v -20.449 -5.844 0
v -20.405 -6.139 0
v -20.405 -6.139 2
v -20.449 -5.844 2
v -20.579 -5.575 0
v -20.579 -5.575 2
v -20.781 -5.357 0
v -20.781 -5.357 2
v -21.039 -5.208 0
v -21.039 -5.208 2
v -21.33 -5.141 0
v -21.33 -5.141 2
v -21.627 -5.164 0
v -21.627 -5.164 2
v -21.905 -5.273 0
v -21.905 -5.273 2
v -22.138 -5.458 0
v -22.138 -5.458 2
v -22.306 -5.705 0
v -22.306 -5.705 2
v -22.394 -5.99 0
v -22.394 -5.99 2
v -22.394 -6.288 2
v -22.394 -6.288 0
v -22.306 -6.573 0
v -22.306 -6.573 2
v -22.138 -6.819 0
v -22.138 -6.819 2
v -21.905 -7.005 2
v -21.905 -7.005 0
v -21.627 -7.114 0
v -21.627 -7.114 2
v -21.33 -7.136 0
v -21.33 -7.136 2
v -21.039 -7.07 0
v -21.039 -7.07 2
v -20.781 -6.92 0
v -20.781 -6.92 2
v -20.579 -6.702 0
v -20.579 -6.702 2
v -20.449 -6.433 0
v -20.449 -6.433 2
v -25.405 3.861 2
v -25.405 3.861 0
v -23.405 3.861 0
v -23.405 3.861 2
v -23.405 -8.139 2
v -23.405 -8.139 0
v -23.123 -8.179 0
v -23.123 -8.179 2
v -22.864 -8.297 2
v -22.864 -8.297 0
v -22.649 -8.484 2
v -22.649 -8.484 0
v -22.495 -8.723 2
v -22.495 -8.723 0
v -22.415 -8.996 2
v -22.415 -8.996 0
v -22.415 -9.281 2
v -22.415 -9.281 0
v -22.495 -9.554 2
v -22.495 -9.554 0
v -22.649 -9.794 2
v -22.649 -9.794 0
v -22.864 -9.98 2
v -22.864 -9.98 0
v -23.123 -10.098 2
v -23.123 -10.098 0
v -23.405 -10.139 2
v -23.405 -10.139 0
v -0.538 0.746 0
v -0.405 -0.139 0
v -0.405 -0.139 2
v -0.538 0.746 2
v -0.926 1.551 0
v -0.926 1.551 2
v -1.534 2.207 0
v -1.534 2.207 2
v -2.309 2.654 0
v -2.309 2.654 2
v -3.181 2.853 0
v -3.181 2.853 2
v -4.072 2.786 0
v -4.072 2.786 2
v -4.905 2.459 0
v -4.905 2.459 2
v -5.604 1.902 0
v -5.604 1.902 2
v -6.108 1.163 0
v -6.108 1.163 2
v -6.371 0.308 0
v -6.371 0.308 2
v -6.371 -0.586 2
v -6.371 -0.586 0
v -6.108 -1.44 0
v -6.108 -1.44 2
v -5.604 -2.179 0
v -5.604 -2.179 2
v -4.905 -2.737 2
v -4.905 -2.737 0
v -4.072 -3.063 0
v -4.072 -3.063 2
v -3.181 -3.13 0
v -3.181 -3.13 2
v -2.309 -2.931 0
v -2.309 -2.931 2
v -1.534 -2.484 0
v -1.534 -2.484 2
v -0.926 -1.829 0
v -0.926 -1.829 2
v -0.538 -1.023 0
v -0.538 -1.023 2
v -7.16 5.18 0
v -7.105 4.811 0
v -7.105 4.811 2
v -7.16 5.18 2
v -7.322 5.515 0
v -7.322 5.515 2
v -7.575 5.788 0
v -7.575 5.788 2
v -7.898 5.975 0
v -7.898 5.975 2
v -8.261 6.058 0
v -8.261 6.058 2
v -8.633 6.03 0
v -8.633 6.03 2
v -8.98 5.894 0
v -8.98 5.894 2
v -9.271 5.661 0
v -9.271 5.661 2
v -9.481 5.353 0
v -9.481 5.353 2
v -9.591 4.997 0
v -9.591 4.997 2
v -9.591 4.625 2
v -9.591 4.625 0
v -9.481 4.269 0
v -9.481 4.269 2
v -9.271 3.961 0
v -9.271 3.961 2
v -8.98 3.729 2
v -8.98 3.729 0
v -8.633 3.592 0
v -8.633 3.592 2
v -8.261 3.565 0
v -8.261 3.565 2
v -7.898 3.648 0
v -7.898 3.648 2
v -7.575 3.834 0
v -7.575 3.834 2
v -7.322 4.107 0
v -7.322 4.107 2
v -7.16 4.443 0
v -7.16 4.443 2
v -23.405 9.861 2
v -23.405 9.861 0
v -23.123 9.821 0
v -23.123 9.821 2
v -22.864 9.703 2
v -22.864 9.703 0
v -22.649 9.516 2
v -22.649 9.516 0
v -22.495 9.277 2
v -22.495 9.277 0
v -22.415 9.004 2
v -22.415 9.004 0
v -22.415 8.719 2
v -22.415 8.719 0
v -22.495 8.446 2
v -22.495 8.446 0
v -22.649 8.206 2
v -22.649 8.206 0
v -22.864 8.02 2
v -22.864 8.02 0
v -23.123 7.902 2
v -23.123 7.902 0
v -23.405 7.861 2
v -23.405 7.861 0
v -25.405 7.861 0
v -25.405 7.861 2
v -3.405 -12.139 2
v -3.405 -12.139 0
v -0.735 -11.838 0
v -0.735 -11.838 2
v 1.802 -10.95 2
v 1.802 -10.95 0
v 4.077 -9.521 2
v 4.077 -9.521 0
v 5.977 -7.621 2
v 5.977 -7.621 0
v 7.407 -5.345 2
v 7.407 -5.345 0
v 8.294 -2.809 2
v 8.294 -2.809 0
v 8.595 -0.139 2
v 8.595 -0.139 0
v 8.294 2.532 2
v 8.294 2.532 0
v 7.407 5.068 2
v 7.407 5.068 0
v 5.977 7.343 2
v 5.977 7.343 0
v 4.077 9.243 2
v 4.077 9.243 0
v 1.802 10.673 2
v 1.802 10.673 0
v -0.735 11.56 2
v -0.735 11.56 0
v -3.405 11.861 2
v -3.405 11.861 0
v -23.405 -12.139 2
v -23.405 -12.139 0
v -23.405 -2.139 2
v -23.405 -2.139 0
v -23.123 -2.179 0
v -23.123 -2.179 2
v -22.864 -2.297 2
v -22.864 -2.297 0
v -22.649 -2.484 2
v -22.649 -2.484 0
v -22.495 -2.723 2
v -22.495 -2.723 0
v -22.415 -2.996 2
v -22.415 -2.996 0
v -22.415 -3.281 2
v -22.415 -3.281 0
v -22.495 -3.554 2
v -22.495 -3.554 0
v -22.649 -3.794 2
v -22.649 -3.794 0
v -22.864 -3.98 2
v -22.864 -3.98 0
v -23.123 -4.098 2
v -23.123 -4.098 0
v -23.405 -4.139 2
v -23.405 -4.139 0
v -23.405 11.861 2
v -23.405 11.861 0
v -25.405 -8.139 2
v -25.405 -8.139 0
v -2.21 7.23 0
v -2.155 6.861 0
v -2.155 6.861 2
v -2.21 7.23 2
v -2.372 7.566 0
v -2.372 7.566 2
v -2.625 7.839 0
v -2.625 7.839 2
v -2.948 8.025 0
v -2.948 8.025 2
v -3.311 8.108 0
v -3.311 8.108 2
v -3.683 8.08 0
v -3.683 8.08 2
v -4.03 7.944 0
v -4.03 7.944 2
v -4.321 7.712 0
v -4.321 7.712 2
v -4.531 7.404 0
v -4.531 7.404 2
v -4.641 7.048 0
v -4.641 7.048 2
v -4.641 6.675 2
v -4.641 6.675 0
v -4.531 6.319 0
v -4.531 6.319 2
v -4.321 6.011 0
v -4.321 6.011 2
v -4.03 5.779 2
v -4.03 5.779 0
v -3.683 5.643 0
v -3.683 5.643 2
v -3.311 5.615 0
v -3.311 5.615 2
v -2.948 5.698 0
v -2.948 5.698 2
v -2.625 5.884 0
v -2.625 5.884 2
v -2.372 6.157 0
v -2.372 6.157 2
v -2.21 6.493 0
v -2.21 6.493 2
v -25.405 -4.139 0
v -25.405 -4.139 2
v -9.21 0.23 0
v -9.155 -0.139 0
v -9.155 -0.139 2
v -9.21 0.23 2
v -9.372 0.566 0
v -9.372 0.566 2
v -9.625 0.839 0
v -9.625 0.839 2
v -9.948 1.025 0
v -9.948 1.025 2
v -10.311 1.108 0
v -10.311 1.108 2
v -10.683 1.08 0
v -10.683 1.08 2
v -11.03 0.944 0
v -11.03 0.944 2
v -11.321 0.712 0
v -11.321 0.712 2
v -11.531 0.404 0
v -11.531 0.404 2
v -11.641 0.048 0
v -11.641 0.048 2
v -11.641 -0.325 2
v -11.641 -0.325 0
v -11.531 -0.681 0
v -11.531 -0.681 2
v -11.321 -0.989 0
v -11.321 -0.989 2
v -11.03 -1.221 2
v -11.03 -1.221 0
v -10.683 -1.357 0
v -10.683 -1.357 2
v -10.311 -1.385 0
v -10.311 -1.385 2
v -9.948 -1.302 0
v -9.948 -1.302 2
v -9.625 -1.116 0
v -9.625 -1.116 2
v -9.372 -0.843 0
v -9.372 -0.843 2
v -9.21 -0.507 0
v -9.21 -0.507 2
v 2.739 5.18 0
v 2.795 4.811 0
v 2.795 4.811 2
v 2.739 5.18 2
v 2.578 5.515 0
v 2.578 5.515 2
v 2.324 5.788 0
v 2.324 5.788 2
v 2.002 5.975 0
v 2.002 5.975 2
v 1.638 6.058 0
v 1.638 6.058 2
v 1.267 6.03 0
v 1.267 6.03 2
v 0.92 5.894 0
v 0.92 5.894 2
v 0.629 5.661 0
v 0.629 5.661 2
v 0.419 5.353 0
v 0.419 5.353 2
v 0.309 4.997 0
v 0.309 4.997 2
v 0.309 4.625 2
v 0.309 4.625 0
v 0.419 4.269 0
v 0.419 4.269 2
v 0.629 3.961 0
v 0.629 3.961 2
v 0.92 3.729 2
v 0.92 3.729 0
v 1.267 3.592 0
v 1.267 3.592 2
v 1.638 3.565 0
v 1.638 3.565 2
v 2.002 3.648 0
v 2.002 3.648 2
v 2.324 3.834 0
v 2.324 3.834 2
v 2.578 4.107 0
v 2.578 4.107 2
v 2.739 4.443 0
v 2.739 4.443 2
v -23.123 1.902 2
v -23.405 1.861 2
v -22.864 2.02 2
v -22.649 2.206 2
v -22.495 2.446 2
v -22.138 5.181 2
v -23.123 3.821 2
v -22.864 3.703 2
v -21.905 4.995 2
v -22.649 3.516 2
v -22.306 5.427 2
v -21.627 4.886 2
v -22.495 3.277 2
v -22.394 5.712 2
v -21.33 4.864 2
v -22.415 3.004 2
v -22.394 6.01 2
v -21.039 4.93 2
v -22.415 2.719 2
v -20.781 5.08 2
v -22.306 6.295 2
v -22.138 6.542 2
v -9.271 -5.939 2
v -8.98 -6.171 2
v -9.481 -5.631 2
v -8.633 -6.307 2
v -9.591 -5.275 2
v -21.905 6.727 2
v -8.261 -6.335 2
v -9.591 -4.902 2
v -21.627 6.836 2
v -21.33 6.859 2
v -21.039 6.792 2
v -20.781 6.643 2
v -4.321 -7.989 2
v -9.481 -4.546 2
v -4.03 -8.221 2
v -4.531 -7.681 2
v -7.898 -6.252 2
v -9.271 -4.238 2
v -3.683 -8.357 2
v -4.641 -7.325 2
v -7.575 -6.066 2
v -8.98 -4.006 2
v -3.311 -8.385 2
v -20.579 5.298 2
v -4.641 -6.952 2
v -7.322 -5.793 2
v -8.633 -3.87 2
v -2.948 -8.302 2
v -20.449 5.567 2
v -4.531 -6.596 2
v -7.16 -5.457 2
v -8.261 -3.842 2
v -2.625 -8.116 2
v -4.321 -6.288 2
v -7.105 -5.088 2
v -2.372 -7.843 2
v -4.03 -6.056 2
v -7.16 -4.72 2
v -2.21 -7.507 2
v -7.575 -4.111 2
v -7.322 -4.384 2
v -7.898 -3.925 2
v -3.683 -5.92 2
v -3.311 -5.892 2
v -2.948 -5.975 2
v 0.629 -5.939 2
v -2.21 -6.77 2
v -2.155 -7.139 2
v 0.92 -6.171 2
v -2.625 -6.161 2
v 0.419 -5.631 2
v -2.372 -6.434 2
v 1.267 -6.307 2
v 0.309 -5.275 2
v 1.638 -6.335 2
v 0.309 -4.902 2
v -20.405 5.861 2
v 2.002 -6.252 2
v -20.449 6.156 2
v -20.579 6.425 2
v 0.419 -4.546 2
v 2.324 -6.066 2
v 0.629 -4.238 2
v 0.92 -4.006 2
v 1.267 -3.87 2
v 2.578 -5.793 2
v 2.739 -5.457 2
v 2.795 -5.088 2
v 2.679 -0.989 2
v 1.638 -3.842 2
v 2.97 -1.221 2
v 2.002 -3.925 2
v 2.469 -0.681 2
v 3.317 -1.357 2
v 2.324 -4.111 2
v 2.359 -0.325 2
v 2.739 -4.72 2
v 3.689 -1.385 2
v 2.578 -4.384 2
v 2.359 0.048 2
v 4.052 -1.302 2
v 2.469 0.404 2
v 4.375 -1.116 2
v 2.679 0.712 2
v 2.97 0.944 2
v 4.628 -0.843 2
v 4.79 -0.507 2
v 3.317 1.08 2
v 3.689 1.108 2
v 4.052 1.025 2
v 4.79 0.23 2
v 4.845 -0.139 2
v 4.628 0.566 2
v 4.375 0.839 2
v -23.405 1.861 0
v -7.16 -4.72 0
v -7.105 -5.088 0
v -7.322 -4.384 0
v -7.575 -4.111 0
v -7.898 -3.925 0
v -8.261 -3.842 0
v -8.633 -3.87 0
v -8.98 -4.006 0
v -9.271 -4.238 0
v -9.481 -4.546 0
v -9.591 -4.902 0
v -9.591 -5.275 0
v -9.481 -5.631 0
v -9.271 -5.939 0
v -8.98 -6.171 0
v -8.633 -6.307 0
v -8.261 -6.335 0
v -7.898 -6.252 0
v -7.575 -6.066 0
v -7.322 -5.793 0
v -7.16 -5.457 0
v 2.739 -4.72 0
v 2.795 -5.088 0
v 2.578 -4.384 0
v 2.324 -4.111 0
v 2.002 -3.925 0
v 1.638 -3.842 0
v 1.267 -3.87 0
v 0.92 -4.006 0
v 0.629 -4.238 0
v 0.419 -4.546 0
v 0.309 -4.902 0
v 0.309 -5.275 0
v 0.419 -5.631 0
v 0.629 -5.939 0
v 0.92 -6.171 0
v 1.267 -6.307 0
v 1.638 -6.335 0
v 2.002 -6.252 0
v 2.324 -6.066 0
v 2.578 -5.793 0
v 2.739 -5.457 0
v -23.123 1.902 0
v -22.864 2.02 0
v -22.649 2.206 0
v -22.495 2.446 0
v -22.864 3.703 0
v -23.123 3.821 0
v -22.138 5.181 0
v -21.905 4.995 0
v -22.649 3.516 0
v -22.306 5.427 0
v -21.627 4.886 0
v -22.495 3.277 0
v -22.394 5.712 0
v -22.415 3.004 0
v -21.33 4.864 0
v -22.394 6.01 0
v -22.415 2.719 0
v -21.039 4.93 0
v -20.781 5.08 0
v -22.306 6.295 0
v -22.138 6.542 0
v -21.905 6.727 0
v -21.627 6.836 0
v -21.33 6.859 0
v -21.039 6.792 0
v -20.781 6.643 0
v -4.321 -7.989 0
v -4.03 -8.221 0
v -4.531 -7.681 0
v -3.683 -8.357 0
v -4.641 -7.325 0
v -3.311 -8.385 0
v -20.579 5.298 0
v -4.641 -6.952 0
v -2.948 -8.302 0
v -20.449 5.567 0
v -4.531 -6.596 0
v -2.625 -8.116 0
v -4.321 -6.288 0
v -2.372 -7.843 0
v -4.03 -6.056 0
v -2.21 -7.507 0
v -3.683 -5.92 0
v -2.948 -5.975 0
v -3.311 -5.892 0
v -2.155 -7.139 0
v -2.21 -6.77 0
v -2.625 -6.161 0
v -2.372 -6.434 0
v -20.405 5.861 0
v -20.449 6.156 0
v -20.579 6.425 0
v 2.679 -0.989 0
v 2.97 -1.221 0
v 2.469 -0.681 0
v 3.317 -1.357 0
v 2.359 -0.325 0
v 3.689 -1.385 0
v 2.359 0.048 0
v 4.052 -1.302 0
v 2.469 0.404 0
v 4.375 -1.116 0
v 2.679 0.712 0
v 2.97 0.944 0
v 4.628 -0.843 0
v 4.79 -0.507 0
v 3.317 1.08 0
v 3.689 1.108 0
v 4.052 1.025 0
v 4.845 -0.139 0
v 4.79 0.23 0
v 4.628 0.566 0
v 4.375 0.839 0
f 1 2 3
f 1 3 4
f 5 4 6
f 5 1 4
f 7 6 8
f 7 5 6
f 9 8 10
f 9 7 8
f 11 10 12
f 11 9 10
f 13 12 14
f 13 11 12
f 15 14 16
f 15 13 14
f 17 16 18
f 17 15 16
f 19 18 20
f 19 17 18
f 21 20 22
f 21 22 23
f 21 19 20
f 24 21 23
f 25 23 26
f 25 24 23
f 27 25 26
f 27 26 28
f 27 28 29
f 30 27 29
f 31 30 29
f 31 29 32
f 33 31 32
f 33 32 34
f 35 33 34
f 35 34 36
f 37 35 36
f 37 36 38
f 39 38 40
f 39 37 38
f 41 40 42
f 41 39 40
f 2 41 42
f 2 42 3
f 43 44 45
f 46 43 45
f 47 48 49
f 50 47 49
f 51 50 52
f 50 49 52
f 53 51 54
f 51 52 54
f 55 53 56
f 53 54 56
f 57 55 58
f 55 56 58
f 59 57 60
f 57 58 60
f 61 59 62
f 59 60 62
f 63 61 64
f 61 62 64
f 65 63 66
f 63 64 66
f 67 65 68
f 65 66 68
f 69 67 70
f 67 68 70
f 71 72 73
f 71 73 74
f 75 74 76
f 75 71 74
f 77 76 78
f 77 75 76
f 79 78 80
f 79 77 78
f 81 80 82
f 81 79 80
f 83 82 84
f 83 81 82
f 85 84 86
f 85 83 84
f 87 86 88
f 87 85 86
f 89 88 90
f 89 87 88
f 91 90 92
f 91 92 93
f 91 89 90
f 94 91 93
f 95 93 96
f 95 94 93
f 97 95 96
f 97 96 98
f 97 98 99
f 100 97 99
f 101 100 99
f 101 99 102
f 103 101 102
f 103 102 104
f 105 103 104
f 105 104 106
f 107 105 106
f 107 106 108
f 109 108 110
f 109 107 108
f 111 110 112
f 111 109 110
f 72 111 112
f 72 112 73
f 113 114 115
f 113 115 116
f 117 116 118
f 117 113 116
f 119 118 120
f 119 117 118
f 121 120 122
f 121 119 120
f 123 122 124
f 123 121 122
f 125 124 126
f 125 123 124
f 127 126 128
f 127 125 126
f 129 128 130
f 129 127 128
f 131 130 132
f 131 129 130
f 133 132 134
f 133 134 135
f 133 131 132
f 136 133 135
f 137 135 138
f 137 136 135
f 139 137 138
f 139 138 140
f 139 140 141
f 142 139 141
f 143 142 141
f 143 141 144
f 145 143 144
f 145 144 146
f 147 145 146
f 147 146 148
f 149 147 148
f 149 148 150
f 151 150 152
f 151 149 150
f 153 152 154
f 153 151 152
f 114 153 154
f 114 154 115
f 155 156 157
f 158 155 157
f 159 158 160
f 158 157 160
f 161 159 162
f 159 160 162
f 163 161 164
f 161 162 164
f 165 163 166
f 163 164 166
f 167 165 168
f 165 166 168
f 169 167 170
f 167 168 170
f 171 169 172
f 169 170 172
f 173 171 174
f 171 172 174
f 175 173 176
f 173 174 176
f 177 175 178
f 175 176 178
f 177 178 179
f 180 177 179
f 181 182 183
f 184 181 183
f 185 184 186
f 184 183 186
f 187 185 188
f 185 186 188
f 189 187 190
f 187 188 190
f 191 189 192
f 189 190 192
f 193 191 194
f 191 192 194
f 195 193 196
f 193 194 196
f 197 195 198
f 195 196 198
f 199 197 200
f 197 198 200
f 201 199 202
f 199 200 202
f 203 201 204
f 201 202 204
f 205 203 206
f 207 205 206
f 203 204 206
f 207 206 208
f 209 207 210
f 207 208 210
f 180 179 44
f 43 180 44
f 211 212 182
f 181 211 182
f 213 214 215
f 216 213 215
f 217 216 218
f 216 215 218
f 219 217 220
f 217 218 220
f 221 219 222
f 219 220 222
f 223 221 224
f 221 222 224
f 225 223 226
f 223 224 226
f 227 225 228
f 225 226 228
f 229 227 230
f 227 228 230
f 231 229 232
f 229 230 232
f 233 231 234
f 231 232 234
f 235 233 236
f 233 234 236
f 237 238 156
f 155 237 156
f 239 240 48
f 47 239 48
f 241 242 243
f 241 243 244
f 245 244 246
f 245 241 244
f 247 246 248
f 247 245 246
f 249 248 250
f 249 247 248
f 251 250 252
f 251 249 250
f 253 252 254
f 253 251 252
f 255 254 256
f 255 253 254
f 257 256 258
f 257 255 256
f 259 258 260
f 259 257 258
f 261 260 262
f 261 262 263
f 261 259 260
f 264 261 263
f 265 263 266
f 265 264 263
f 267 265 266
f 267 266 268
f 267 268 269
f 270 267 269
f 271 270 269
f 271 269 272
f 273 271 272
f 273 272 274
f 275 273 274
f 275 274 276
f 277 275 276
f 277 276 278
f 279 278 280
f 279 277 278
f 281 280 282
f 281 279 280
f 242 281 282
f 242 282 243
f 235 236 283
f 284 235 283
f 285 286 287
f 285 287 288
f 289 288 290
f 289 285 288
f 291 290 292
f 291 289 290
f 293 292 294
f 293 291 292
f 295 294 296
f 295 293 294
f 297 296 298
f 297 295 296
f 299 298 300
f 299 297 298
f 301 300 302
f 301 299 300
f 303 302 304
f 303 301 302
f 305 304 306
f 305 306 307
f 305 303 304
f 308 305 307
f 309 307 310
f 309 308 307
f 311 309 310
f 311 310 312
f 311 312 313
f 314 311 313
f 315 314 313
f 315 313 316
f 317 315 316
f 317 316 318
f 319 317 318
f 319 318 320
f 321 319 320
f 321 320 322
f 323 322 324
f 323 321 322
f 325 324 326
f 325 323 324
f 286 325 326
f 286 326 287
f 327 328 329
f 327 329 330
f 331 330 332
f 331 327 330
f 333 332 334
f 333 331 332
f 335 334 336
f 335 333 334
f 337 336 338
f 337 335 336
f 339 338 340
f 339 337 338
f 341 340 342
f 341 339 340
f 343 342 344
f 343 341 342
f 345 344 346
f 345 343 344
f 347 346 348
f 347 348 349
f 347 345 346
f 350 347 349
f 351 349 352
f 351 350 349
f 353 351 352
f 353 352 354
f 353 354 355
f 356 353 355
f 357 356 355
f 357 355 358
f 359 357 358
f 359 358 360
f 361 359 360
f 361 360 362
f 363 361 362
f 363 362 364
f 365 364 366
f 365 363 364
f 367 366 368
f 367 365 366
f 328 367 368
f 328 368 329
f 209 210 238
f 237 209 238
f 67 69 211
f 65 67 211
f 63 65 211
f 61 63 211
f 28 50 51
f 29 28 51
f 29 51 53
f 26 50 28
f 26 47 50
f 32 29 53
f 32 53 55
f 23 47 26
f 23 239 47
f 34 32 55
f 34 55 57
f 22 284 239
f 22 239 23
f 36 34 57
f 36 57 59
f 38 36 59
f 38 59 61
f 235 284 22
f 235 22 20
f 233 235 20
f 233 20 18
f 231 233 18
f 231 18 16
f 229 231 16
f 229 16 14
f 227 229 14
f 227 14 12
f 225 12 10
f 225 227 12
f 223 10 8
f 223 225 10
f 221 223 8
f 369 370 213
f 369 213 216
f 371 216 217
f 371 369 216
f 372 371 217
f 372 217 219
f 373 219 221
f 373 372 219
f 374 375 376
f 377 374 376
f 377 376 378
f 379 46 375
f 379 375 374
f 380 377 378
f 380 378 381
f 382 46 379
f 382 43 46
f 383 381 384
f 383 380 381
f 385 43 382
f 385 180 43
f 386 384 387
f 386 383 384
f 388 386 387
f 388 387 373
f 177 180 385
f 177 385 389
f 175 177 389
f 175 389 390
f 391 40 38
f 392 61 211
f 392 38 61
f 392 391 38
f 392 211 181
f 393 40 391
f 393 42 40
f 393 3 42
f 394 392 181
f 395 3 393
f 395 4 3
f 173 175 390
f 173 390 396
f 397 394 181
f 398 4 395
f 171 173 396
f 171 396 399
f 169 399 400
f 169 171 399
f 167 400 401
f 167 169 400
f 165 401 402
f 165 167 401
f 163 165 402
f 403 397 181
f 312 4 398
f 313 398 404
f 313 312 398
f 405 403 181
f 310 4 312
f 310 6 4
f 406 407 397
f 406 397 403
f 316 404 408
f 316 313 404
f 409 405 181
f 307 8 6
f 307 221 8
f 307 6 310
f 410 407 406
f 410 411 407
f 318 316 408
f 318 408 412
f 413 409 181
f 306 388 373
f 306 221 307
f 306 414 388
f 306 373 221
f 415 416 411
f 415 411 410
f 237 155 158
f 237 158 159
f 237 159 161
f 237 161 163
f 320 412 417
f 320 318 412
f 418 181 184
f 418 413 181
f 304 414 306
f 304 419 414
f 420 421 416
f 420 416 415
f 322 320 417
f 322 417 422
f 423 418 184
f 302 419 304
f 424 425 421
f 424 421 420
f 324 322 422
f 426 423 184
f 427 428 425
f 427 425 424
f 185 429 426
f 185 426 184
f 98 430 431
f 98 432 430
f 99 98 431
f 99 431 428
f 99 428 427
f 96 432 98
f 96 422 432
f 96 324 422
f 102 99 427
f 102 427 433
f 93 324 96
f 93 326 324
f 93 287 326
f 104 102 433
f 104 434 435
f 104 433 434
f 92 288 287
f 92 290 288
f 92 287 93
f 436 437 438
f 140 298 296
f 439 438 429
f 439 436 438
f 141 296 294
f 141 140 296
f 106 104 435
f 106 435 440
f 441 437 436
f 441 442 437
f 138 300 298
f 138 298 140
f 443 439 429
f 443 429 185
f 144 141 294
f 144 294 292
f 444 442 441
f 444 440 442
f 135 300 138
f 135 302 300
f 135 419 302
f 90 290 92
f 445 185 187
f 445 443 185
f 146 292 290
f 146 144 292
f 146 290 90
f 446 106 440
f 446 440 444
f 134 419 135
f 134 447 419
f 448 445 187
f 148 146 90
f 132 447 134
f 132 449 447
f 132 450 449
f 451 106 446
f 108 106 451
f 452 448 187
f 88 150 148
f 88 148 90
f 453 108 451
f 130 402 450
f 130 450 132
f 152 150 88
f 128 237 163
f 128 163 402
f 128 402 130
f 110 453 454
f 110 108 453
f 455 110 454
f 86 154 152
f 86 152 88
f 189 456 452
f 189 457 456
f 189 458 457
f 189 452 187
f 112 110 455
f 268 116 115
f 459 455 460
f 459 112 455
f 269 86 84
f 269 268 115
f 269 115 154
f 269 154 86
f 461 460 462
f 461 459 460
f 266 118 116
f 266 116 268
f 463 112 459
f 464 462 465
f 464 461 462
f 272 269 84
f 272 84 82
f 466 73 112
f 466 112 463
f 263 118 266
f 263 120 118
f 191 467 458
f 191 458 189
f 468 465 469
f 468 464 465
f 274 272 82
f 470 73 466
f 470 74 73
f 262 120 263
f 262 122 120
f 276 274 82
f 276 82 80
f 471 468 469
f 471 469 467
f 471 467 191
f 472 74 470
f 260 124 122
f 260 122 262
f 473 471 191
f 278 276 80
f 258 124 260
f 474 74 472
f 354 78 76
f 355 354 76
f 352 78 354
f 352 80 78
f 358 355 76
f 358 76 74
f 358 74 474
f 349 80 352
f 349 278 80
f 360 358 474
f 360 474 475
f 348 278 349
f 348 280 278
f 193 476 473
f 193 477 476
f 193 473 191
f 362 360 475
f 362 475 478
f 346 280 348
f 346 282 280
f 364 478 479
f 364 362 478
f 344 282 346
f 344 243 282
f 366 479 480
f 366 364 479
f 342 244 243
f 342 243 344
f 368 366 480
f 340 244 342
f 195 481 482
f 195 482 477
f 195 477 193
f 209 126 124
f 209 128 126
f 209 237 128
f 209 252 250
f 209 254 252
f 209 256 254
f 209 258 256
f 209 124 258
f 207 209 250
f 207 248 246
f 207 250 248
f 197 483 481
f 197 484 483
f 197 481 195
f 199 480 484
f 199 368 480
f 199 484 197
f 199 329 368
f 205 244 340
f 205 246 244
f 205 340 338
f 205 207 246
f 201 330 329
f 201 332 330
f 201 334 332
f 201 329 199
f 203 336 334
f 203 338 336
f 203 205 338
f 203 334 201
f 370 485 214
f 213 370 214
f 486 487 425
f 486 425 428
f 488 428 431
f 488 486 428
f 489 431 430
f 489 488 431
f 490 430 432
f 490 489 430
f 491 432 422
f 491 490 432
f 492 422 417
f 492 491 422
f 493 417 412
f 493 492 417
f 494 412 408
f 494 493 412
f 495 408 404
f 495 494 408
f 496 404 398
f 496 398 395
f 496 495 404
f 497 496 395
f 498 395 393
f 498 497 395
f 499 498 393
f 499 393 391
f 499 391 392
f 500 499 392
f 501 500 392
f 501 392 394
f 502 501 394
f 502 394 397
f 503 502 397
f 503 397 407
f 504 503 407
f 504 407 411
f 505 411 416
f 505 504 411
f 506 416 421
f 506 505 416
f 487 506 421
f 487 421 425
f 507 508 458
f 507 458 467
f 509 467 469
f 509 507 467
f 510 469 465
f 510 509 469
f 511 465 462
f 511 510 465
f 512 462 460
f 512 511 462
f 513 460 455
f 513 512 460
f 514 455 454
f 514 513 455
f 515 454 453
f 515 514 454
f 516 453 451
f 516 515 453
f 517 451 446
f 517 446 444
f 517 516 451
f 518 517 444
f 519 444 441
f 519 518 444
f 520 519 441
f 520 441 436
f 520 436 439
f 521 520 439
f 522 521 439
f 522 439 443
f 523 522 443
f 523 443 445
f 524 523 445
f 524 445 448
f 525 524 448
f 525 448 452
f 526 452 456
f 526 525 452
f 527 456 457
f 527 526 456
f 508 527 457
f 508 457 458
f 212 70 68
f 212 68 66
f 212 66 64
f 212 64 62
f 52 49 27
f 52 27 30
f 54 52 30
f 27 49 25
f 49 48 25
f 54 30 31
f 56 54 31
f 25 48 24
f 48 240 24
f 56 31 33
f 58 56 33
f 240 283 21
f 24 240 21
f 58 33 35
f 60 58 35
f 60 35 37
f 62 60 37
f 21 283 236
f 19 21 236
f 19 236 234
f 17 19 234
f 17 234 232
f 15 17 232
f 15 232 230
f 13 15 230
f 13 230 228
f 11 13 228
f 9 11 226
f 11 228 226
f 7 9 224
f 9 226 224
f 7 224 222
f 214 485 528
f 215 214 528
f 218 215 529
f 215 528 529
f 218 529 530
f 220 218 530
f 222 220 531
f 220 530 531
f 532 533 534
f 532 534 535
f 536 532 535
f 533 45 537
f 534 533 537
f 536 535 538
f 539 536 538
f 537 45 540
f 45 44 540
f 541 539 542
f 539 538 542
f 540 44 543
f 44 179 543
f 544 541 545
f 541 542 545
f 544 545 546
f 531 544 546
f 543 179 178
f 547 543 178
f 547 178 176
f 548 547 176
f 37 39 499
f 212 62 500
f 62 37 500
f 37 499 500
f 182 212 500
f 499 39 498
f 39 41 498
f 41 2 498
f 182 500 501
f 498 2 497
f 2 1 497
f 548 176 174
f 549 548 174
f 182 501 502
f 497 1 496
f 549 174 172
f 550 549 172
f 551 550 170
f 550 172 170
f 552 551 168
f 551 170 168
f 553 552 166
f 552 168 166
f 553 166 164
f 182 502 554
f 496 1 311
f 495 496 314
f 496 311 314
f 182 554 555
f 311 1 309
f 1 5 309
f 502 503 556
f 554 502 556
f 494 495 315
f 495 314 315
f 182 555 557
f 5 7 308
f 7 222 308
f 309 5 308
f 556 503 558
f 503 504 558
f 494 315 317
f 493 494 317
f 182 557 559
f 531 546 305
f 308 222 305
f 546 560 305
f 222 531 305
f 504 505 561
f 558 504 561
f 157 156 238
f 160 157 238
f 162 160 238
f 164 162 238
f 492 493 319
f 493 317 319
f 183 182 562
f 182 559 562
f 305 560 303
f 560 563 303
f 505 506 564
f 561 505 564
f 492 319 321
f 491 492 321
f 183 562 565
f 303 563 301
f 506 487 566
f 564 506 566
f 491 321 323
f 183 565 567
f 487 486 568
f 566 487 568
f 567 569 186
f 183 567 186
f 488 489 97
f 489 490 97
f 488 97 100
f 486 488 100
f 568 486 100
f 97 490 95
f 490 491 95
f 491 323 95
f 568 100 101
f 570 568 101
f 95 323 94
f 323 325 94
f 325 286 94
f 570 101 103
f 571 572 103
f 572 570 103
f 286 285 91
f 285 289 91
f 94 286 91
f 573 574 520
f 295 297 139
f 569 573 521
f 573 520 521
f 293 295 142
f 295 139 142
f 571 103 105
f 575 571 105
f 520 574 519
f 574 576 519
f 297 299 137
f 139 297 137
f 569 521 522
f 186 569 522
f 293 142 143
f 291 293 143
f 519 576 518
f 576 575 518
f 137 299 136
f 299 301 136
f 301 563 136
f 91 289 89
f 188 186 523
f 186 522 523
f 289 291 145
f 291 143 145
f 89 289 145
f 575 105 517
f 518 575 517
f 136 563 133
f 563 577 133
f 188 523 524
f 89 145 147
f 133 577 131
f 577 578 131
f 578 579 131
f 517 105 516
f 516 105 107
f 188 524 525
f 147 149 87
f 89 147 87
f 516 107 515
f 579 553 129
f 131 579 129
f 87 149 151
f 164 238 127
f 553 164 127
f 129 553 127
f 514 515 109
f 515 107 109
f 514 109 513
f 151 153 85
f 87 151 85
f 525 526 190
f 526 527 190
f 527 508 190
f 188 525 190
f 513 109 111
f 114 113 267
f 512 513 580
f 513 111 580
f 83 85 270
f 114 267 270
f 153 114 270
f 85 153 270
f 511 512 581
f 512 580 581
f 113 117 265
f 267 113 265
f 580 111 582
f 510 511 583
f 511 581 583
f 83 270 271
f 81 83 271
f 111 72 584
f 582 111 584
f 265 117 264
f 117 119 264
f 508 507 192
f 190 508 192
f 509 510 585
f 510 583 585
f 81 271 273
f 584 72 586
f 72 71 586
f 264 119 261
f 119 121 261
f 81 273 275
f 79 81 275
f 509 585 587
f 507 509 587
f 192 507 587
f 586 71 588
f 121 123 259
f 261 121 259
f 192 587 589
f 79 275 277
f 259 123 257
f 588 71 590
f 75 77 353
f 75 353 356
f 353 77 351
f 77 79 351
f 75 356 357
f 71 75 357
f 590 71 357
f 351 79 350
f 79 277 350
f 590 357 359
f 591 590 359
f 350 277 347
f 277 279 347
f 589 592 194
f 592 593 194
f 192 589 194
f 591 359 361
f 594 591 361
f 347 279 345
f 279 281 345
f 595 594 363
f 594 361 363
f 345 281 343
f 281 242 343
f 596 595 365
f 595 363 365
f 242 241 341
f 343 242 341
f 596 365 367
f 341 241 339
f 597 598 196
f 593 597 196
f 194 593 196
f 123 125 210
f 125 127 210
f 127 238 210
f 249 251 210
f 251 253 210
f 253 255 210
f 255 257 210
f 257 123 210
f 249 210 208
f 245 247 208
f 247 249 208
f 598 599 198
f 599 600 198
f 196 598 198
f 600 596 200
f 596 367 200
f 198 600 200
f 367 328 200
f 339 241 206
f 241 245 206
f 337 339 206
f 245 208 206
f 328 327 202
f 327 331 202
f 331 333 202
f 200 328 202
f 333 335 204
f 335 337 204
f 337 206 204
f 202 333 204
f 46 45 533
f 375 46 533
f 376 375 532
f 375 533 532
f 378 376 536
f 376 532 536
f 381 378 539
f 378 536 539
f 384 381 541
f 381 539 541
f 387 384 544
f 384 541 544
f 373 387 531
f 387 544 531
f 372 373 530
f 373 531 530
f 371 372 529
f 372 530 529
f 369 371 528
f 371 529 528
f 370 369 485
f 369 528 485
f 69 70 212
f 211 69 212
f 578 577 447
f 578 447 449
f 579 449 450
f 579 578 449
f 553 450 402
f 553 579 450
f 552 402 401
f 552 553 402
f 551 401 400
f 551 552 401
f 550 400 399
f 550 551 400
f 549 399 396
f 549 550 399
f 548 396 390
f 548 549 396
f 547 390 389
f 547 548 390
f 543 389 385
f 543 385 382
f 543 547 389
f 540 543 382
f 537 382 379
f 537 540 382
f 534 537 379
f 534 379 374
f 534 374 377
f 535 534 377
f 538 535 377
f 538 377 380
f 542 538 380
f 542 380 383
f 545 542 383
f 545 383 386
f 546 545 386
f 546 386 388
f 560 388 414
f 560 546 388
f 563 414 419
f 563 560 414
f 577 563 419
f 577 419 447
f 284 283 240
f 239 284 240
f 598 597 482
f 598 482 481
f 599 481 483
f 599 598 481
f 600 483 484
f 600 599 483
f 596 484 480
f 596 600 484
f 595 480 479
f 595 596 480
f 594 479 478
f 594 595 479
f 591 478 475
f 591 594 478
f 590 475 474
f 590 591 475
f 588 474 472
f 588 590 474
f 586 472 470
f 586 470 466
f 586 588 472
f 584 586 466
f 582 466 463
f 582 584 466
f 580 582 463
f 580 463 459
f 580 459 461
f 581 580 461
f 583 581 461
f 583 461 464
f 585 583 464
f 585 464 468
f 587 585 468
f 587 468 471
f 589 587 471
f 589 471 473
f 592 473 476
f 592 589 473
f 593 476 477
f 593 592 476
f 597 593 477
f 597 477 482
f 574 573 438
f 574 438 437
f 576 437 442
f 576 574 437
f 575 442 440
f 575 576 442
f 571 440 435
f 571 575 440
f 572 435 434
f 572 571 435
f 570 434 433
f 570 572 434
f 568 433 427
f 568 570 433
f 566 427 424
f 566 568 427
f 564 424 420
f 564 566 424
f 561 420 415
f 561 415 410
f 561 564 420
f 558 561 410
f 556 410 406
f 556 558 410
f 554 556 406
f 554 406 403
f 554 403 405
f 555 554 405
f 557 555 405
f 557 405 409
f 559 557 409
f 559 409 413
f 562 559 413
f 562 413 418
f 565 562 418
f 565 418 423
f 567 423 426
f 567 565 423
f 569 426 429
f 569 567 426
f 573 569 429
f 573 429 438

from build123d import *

# Parameters (mm, degrees)
SKETCH_8_R      = 1.25
SKETCH_8_R_2    = 3
SKETCH_8_R_3    = 1
EXTRUDE_1_DEPTH = 2


with BuildPart() as part:
    # 草圖8 → 填料-伸長1 (new body)
    with BuildSketch(Plane.XY):
        with BuildLine():
            Line((-23.40478598, 11.861352689), (-23.40478598, 9.861352689))
            ThreePointArc((-23.40478598, 9.861352689), (-22.40478598, 8.861352689), (-23.40478598, 7.861352689))
            Line((-23.40478598, 7.861352689), (-25.40478598, 7.861352689))
            Line((-25.40478598, 7.861352689), (-25.40478598, 3.861352689))
            Line((-25.40478598, 3.861352689), (-23.40478598, 3.861352689))
            ThreePointArc((-23.40478598, 3.861352689), (-22.40478598, 2.861352689), (-23.40478598, 1.861352689))
            Line((-23.40478598, 1.861352689), (-23.40478598, -2.138647311))
            ThreePointArc((-23.40478598, -2.138647311), (-22.40478598, -3.138647311), (-23.40478598, -4.138647311))
            Line((-23.40478598, -4.138647311), (-25.40478598, -4.138647311))
            Line((-25.40478598, -4.138647311), (-25.40478598, -8.138647311))
            Line((-25.40478598, -8.138647311), (-23.40478598, -8.138647311))
            ThreePointArc((-23.40478598, -8.138647311), (-22.40478598, -9.138647311), (-23.40478598, -10.138647311))
            Line((-23.40478598, -10.138647311), (-23.40478598, -12.138647311))
            Line((-23.40478598, -12.138647311), (-3.40478598, -12.138647311))
            ThreePointArc((-3.40478598, -12.138647311), (8.59521402, -0.138647311), (-3.40478598, 11.861352689))
            Line((-3.40478598, 11.861352689), (-23.40478598, 11.861352689))
        make_face()
        with Locations((-3.40478598, 6.861352689)):
            Circle(SKETCH_8_R, mode=Mode.SUBTRACT)
        with Locations((1.544961489, 4.811100157)):
            Circle(SKETCH_8_R, mode=Mode.SUBTRACT)
        with Locations((-3.40478598, -0.138647311)):
            Circle(SKETCH_8_R_2, mode=Mode.SUBTRACT)
        with Locations((3.59521402, -0.138647311)):
            Circle(SKETCH_8_R, mode=Mode.SUBTRACT)
        with Locations((1.544961489, -5.08839478)):
            Circle(SKETCH_8_R, mode=Mode.SUBTRACT)
        with Locations((-3.40478598, -7.138647311)):
            Circle(SKETCH_8_R, mode=Mode.SUBTRACT)
        with Locations((-8.354533448, -5.08839478)):
            Circle(SKETCH_8_R, mode=Mode.SUBTRACT)
        with Locations((-10.40478598, -0.138647311)):
            Circle(SKETCH_8_R, mode=Mode.SUBTRACT)
        with Locations((-8.354533448, 4.811100157)):
            Circle(SKETCH_8_R, mode=Mode.SUBTRACT)
        with Locations((-21.40478598, 5.861352689)):
            Circle(SKETCH_8_R_3, mode=Mode.SUBTRACT)
        with Locations((-21.40478598, -6.138647311)):
            Circle(SKETCH_8_R_3, mode=Mode.SUBTRACT)
    extrude(amount=EXTRUDE_1_DEPTH)


solid = part.part
